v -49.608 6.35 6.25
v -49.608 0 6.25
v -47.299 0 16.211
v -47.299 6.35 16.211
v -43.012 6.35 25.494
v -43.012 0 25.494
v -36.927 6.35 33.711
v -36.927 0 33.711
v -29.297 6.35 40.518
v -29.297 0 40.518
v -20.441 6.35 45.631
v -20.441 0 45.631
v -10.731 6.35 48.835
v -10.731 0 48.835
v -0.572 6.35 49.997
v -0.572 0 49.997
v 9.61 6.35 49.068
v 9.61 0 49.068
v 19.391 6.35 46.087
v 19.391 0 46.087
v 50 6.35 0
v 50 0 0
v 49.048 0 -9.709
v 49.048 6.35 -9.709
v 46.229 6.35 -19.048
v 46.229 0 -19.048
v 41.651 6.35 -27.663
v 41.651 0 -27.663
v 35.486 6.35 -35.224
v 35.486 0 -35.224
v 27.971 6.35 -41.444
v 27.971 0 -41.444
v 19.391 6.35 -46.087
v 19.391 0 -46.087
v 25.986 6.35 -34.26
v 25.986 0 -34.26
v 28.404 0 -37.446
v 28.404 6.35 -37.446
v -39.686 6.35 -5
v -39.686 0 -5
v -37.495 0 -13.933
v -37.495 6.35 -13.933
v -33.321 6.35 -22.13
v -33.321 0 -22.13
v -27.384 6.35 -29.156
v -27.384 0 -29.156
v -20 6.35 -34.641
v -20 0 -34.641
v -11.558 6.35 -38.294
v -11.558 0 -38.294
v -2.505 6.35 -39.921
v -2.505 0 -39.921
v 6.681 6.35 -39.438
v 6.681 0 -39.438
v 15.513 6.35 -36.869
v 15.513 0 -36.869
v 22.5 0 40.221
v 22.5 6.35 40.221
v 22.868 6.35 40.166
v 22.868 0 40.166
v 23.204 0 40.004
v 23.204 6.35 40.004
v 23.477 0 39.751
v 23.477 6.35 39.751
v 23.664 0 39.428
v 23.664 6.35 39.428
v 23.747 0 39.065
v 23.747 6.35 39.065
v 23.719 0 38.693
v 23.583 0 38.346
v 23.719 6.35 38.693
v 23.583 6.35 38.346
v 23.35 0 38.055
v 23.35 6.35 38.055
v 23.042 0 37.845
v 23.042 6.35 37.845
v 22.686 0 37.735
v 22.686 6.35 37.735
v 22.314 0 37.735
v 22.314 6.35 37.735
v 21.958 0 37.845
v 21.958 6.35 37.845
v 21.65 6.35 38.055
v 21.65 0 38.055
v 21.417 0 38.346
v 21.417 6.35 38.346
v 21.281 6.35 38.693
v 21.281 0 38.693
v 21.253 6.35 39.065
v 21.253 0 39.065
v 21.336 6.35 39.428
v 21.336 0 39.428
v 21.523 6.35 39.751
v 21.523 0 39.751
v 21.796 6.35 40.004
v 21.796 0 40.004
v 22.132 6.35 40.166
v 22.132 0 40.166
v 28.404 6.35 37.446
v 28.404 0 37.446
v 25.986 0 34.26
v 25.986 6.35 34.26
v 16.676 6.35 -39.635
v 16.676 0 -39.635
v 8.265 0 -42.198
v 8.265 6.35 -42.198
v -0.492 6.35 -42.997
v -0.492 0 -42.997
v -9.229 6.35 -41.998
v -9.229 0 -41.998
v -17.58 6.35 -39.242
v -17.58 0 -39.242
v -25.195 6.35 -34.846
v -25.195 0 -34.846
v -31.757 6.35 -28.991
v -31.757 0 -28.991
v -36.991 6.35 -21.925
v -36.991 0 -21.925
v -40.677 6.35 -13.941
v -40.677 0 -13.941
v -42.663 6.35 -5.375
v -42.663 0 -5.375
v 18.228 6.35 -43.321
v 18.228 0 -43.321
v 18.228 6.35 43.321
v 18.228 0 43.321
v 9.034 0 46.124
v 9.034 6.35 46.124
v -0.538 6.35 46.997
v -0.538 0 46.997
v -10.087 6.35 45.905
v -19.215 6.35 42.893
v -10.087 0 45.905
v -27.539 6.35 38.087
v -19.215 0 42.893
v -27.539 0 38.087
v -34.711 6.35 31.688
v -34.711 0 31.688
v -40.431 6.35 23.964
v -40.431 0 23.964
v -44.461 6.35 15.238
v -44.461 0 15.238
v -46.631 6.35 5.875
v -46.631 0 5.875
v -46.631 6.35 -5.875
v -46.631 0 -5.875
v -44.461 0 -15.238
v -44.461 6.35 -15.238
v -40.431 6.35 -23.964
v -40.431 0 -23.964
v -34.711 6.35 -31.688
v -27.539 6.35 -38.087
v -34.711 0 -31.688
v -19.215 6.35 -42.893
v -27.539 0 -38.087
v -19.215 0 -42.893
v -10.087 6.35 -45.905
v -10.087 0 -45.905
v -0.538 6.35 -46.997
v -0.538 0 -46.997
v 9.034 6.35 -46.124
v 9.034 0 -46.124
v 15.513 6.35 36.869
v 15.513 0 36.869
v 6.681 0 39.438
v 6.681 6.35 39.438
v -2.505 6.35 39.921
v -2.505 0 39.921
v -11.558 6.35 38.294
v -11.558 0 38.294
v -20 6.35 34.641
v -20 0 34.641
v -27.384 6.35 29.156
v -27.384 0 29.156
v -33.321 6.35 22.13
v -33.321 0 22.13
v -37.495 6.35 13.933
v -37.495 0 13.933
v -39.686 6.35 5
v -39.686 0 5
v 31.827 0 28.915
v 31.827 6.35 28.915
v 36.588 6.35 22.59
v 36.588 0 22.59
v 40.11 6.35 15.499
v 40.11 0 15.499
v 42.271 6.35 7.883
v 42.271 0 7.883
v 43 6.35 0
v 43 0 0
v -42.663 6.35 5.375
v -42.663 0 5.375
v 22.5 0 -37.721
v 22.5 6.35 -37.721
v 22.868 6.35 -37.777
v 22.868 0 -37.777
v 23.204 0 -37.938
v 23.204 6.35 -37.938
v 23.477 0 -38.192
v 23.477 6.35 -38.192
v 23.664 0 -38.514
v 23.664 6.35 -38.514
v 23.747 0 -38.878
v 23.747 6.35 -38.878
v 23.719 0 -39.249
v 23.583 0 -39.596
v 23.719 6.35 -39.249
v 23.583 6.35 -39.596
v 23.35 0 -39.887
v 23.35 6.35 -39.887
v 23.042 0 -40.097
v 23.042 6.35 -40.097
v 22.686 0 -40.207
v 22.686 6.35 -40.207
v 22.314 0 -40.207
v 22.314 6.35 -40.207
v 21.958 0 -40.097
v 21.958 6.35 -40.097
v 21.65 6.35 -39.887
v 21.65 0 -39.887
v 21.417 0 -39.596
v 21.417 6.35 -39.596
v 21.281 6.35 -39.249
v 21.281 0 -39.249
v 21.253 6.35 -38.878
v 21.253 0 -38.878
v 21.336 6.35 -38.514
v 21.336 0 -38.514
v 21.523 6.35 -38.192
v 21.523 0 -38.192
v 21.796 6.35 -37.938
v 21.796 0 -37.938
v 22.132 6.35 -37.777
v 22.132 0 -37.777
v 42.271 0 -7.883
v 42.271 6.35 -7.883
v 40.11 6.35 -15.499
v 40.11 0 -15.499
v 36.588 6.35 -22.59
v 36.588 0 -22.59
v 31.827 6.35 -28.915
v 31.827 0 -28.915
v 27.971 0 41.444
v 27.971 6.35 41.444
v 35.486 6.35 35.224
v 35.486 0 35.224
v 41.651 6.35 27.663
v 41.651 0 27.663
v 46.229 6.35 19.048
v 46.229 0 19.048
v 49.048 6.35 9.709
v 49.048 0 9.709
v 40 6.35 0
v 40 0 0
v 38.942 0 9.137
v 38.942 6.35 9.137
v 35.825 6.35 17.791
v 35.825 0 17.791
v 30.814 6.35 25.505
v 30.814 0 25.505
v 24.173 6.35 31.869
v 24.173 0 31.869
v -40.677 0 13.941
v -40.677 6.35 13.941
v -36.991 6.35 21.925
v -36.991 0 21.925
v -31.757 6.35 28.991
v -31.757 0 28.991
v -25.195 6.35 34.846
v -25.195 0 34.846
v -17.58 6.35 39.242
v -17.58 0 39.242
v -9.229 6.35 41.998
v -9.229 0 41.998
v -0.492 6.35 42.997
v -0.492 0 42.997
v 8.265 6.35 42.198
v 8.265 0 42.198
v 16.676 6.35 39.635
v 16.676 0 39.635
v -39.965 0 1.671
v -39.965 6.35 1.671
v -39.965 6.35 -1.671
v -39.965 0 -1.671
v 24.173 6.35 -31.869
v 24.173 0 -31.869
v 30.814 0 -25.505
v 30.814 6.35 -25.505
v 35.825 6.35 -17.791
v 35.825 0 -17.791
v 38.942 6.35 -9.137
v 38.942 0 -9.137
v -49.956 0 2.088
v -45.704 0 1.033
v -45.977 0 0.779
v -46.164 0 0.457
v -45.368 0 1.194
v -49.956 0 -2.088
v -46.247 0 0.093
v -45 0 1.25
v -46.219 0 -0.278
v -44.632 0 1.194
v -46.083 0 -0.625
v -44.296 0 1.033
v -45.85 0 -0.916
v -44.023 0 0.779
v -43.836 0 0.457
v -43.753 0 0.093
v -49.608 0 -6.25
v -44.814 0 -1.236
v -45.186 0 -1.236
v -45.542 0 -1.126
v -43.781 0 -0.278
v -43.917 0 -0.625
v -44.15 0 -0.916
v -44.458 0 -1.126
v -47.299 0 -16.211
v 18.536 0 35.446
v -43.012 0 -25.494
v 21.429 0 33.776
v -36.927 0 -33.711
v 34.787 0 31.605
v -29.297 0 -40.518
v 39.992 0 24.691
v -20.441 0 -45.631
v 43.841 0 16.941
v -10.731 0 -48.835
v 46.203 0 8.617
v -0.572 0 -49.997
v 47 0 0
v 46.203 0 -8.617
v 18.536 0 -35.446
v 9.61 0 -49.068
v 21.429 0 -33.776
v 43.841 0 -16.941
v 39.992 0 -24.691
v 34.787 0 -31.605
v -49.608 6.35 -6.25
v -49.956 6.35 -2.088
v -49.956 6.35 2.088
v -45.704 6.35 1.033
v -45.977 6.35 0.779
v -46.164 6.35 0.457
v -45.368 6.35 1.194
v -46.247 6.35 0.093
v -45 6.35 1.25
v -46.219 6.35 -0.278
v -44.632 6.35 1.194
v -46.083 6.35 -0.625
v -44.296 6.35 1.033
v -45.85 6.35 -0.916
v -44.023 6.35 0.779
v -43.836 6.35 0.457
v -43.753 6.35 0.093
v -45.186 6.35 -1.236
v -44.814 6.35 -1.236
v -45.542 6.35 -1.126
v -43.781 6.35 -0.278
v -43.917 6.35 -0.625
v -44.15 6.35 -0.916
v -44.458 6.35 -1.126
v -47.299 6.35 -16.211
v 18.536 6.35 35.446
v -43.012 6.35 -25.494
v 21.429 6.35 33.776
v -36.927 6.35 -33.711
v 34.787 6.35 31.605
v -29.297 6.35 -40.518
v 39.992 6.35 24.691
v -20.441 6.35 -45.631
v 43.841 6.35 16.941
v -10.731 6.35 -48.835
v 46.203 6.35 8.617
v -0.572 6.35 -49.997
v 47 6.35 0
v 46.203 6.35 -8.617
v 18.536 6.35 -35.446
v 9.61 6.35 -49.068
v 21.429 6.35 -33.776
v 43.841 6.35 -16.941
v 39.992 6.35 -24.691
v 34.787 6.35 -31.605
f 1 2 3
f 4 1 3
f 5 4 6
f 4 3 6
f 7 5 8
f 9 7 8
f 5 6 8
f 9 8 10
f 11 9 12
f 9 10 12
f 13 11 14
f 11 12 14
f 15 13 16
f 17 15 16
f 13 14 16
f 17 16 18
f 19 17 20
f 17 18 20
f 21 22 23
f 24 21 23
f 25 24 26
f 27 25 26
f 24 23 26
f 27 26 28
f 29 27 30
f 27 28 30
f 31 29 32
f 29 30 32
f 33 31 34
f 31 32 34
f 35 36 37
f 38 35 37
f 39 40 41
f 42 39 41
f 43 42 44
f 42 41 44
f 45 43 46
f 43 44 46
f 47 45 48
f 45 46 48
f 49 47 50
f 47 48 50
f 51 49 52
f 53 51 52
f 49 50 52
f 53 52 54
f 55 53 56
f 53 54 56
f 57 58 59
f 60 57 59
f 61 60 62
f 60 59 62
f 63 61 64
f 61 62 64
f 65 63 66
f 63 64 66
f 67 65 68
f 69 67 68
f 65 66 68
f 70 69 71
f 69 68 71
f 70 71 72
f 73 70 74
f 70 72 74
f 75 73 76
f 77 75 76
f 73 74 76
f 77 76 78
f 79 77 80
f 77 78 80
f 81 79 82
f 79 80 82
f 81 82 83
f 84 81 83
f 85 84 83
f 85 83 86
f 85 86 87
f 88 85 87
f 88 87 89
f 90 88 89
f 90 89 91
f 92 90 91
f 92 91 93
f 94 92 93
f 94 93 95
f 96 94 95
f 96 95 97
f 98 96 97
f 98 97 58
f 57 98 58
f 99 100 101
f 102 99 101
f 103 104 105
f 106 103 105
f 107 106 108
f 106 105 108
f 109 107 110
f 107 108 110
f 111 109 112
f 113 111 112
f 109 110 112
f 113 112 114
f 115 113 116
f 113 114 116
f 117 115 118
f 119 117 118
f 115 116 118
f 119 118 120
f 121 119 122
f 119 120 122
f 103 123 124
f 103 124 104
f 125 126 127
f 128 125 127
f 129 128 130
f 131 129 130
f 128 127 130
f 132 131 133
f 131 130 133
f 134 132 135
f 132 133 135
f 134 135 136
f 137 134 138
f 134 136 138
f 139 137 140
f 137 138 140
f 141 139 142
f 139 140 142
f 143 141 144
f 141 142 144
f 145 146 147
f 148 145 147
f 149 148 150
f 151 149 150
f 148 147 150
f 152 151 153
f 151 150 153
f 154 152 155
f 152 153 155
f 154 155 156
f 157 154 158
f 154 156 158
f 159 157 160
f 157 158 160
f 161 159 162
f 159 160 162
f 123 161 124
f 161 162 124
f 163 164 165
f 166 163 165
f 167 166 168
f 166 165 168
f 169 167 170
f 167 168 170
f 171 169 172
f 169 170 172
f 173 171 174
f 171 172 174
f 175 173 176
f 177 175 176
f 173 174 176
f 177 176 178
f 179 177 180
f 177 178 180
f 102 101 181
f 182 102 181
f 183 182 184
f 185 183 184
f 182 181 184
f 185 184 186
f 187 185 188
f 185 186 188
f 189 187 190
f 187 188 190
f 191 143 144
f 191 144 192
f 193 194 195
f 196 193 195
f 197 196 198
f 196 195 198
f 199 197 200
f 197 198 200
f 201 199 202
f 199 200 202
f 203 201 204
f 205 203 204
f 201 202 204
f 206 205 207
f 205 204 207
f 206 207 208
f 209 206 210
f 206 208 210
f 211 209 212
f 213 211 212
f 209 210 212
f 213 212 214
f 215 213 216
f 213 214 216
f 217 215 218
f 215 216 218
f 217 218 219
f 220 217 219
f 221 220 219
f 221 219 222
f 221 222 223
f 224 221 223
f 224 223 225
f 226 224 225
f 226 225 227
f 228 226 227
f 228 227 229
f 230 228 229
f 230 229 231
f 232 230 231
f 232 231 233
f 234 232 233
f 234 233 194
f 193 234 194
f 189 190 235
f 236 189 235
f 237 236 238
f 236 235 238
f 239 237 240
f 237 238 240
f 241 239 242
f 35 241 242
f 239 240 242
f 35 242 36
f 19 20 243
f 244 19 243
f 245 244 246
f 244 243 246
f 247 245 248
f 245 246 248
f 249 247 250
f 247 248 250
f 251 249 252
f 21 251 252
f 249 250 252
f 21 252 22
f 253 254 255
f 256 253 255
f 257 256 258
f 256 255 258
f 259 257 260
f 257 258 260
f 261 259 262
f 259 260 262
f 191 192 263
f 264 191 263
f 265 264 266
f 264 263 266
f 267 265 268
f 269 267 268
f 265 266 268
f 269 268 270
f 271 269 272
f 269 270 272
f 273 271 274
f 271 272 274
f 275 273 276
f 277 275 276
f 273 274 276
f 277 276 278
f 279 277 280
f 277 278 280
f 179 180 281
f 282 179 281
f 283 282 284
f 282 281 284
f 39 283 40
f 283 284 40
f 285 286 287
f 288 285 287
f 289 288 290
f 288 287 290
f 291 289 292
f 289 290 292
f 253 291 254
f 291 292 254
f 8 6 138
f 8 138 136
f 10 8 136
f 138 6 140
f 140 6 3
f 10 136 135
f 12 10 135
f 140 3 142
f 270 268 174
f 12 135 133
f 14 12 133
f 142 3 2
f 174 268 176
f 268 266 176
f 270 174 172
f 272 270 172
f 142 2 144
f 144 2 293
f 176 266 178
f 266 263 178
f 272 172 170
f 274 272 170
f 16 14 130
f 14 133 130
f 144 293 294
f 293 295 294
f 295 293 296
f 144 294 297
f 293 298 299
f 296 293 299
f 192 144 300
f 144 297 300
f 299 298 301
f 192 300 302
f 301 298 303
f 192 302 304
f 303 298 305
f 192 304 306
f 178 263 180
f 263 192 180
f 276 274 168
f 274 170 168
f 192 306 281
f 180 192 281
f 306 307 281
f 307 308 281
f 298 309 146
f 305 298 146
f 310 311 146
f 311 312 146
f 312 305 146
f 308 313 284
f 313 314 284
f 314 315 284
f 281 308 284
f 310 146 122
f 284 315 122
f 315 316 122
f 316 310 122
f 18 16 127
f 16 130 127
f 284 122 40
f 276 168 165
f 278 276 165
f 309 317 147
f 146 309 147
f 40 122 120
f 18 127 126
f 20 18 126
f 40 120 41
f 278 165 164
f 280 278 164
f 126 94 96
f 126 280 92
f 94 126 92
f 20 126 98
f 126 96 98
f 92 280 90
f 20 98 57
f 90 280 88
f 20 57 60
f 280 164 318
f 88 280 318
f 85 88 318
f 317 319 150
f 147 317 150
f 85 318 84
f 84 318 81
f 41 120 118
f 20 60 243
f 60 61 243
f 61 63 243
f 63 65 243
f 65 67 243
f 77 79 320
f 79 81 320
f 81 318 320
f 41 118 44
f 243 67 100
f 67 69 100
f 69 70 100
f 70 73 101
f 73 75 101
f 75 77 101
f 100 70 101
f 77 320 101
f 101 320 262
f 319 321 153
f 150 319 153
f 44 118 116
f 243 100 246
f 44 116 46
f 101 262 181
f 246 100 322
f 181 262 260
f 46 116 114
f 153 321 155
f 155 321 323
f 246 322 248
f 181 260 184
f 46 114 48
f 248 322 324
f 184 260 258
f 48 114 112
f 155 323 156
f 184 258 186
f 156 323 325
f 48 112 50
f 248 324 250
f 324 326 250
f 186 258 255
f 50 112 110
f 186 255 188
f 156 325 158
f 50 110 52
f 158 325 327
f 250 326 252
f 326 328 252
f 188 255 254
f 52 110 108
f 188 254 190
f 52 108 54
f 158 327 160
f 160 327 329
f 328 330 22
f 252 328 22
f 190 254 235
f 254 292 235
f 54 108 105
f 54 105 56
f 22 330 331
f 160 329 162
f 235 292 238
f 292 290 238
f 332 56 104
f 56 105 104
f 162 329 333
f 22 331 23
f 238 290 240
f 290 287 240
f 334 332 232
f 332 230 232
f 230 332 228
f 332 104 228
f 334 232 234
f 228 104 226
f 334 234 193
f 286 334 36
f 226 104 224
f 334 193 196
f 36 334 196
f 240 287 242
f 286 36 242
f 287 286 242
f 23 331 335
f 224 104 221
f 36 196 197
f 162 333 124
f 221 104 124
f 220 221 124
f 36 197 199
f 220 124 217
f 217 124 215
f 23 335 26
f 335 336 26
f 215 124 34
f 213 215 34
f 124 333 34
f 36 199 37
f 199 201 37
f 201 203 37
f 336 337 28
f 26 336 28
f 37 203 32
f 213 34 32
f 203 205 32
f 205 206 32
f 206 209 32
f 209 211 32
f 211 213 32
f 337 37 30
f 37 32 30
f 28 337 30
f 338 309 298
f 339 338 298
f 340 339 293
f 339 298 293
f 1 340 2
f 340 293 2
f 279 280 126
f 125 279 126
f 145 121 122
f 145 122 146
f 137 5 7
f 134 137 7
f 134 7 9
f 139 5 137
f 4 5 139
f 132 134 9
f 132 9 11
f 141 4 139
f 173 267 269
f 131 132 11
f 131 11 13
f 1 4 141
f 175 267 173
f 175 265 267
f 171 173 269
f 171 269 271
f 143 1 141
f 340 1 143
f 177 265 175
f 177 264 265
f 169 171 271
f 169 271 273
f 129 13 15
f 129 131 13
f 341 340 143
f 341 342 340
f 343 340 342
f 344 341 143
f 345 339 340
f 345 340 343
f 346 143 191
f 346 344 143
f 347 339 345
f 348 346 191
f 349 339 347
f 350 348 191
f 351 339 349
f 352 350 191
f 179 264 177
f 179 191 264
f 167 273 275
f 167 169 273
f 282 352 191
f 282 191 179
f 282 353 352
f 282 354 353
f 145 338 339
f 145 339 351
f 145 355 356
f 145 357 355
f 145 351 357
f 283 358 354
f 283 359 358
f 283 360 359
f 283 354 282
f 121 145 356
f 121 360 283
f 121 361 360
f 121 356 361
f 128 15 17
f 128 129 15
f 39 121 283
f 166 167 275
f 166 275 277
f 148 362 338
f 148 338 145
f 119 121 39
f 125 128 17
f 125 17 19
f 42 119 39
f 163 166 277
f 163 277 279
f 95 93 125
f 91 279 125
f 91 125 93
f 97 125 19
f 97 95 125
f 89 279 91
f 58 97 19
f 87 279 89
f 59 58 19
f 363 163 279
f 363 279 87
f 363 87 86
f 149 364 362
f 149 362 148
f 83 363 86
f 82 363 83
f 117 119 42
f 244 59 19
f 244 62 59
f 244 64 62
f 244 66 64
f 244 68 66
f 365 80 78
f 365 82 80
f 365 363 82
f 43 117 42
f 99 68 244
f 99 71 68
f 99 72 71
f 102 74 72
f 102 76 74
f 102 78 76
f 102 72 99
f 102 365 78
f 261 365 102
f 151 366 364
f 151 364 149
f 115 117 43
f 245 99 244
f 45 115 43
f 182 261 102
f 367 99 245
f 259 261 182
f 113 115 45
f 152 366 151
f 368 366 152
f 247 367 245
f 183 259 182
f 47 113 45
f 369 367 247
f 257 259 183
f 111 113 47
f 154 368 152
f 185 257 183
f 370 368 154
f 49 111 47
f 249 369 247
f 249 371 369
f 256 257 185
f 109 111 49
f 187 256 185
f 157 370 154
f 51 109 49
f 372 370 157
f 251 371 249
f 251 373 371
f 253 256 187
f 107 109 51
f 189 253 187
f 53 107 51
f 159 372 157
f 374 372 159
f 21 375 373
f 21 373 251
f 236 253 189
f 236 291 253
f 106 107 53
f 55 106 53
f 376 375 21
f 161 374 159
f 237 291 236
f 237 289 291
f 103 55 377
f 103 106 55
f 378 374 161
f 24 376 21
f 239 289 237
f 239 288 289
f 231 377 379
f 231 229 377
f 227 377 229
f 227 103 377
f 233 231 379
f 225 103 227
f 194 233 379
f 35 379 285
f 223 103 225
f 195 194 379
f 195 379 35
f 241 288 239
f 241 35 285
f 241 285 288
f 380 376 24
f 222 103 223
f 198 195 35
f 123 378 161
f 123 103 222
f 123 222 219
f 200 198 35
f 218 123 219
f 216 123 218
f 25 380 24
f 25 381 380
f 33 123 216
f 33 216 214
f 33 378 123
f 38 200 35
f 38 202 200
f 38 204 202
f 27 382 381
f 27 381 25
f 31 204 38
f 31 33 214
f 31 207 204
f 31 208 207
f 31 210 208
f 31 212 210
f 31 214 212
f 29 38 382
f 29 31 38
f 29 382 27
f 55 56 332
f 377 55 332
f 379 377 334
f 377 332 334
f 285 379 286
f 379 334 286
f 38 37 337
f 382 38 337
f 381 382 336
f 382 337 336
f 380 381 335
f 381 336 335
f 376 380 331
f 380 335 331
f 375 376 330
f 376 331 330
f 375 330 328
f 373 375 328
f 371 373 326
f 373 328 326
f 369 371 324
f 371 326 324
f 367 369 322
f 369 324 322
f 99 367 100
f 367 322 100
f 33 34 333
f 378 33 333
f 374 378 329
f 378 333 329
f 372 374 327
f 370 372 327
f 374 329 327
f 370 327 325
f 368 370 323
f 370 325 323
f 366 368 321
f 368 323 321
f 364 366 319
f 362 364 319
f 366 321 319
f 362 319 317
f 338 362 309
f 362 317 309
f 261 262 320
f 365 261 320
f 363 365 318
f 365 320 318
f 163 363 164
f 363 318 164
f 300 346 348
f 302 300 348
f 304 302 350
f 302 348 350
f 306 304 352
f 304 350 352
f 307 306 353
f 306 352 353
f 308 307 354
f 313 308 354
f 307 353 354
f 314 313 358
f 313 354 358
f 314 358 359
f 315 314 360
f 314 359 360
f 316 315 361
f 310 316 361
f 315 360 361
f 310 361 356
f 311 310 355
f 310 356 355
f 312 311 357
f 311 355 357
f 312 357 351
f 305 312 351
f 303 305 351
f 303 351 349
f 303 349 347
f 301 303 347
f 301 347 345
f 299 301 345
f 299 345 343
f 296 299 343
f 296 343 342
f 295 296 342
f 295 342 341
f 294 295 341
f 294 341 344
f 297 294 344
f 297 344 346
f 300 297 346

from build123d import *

# Parameters (mm, degrees)
BOSS_EXTRUDE1_DEPTH = 6.35
M3_TAP_HOLES_REACH  = 72.995
SKETCH2_R           = 1.25


with BuildPart() as part:
    # Sketch1 → Boss-Extrude1 (new body)
    with BuildSketch(Plane(origin=(0, 0, 0), x_dir=(1, 0, 0), z_dir=(0, 1, 0))):
        with BuildLine():
            ThreePointArc((50, 0), (44.781853835, 22.239279825), (30.216577315, 39.83664714))
            Line((30.216577315, 39.83664714), (28.403582676, 37.446448312))
            ThreePointArc((28.403582676, 37.446448312), (42.094942605, 20.904923035), (47, 0))
            ThreePointArc((47, 0), (42.094942605, -20.904923035), (28.403582676, -37.446448312))
            Line((28.403582676, -37.446448312), (30.216577315, -39.83664714))
            ThreePointArc((30.216577315, -39.83664714), (44.781853835, -22.239279825), (50, 0))
        make_face()
        with BuildLine():
            ThreePointArc((43, 0), (38.512394298, 19.125780649), (25.986256491, 34.259516541))
            Line((25.986256491, 34.259516541), (24.173261852, 31.869317712))
            ThreePointArc((24.173261852, 31.869317712), (35.825483068, 17.79142386), (40, 0))
            ThreePointArc((40, 0), (35.825483068, -17.79142386), (24.173261852, -31.869317712))
            Line((24.173261852, -31.869317712), (25.986256491, -34.259516541))
            ThreePointArc((25.986256491, -34.259516541), (38.512394298, -19.125780649), (43, 0))
        make_face()
        with BuildLine():
            ThreePointArc((16.6764834, -39.634516541), (21.5, -37.239092363), (25.986256491, -34.259516541))
            Line((25.986256491, -34.259516541), (24.173261852, -31.869317712))
            ThreePointArc((24.173261852, -31.869317712), (20, -34.641016151), (15.513007814, -36.869317712))
            Line((15.513007814, -36.869317712), (16.6764834, -39.634516541))
        make_face()
        with BuildLine():
            ThreePointArc((18.227784182, -43.321448312), (23.5, -40.703193978), (28.403582676, -37.446448312))
            Line((28.403582676, -37.446448312), (25.986256491, -34.259516541))
            ThreePointArc((25.986256491, -34.259516541), (21.5, -37.239092363), (16.6764834, -39.634516541))
            Line((16.6764834, -39.634516541), (18.227784182, -43.321448312))
        make_face()
        with BuildLine():
            ThreePointArc((19.391259768, -46.08664714), (25, -43.301270189), (30.216577315, -39.83664714))
            Line((30.216577315, -39.83664714), (28.403582676, -37.446448312))
            ThreePointArc((28.403582676, -37.446448312), (23.5, -40.703193978), (18.227784182, -43.321448312))
            Line((18.227784182, -43.321448312), (19.391259768, -46.08664714))
        make_face()
        with BuildLine():
            ThreePointArc((-49.607837082, -6.25), (-25, -43.301270189), (19.391259768, -46.08664714))
            Line((19.391259768, -46.08664714), (18.227784182, -43.321448312))
            ThreePointArc((18.227784182, -43.321448312), (-23.5, -40.703193978), (-46.631366858, -5.875))
            Line((-46.631366858, -5.875), (-49.607837082, -6.25))
        make_face()
        with BuildLine():
            ThreePointArc((-42.662739891, -5.375), (-21.5, -37.239092363), (16.6764834, -39.634516541))
            Line((16.6764834, -39.634516541), (15.513007814, -36.869317712))
            ThreePointArc((15.513007814, -36.869317712), (-20, -34.641016151), (-39.686269666, -5))
            Line((-39.686269666, -5), (-42.662739891, -5.375))
        make_face()
        with BuildLine():
            Line((-39.686269666, 5), (-42.662739891, 5.375))
            ThreePointArc((-42.662739891, 5.375), (-43, 0), (-42.662739891, -5.375))
            Line((-42.662739891, -5.375), (-39.686269666, -5))
            ThreePointArc((-39.686269666, -5), (-40, 0), (-39.686269666, 5))
        make_face()
        with BuildLine():
            Line((-42.662739891, 5.375), (-46.631366858, 5.875))
            ThreePointArc((-46.631366858, 5.875), (-47, 0), (-46.631366858, -5.875))
            Line((-46.631366858, -5.875), (-42.662739891, -5.375))
            ThreePointArc((-42.662739891, -5.375), (-43, 0), (-42.662739891, 5.375))
        make_face()
        with BuildLine():
            Line((-46.631366858, 5.875), (-49.607837082, 6.25))
            ThreePointArc((-49.607837082, 6.25), (-50, 0), (-49.607837082, -6.25))
            Line((-49.607837082, -6.25), (-46.631366858, -5.875))
            ThreePointArc((-46.631366858, -5.875), (-47, 0), (-46.631366858, 5.875))
        make_face()
        with BuildLine():
            Line((18.227784182, 43.321448312), (19.391259768, 46.08664714))
            ThreePointArc((19.391259768, 46.08664714), (-25, 43.301270189), (-49.607837082, 6.25))
            Line((-49.607837082, 6.25), (-46.631366858, 5.875))
            ThreePointArc((-46.631366858, 5.875), (-23.5, 40.703193978), (18.227784182, 43.321448312))
        make_face()
        with BuildLine():
            Line((15.513007814, 36.869317712), (16.6764834, 39.634516541))
            ThreePointArc((16.6764834, 39.634516541), (-21.5, 37.239092363), (-42.662739891, 5.375))
            Line((-42.662739891, 5.375), (-39.686269666, 5))
            ThreePointArc((-39.686269666, 5), (-20, 34.641016151), (15.513007814, 36.869317712))
        make_face()
        with BuildLine():
            Line((24.173261852, 31.869317712), (25.986256491, 34.259516541))
            ThreePointArc((25.986256491, 34.259516541), (21.5, 37.239092363), (16.6764834, 39.634516541))
            Line((16.6764834, 39.634516541), (15.513007814, 36.869317712))
            ThreePointArc((15.513007814, 36.869317712), (20, 34.641016151), (24.173261852, 31.869317712))
        make_face()
        with BuildLine():
            Line((25.986256491, 34.259516541), (28.403582676, 37.446448312))
            ThreePointArc((28.403582676, 37.446448312), (23.5, 40.703193978), (18.227784182, 43.321448312))
            Line((18.227784182, 43.321448312), (16.6764834, 39.634516541))
            ThreePointArc((16.6764834, 39.634516541), (21.5, 37.239092363), (25.986256491, 34.259516541))
        make_face()
        with BuildLine():
            Line((28.403582676, 37.446448312), (30.216577315, 39.83664714))
            ThreePointArc((30.216577315, 39.83664714), (25, 43.301270189), (19.391259768, 46.08664714))
            Line((19.391259768, 46.08664714), (18.227784182, 43.321448312))
            ThreePointArc((18.227784182, 43.321448312), (23.5, 40.703193978), (28.403582676, 37.446448312))
        make_face()
    extrude(amount=BOSS_EXTRUDE1_DEPTH)

    # Sketch2 → M3-tap-holes (cut, up to next)
    with BuildSketch(Plane(origin=(0, 6.35, 0), x_dir=(1, 0, 0), z_dir=(0, 1, 0)), mode=Mode.PRIVATE) as m3_tap_holes_sk1:
        with Locations(Location((-45, 0, 0), (0, 0, 270))):
            Circle(SKETCH2_R)
    m3_tap_holes_tool1 = extrude(m3_tap_holes_sk1.sketch, amount=-M3_TAP_HOLES_REACH, mode=Mode.PRIVATE) & part.part
    # Sketch2 → M3-tap-holes (cut, up to next)
    with BuildSketch(Plane(origin=(0, 6.35, 0), x_dir=(1, 0, 0), z_dir=(0, 1, 0)), mode=Mode.PRIVATE) as m3_tap_holes_sk2:
        with Locations(Location((22.5, -38.97114317, 0), (0, 0, 270))):
            Circle(SKETCH2_R)
    m3_tap_holes_tool2 = extrude(m3_tap_holes_sk2.sketch, amount=-M3_TAP_HOLES_REACH, mode=Mode.PRIVATE) & part.part
    # Sketch2 → M3-tap-holes (cut, up to next)
    with BuildSketch(Plane(origin=(0, 6.35, 0), x_dir=(1, 0, 0), z_dir=(0, 1, 0)), mode=Mode.PRIVATE) as m3_tap_holes_sk3:
        with Locations(Location((22.5, 38.97114317, 0), (0, 0, 270))):
            Circle(SKETCH2_R)
    m3_tap_holes_tool3 = extrude(m3_tap_holes_sk3.sketch, amount=-M3_TAP_HOLES_REACH, mode=Mode.PRIVATE) & part.part
    add(m3_tap_holes_tool1.solids().sort_by_distance((-45, 6.35, 0))[0], mode=Mode.SUBTRACT)
    add(m3_tap_holes_tool2.solids().sort_by_distance((22.5, 6.35, 38.971143))[0], mode=Mode.SUBTRACT)
    add(m3_tap_holes_tool3.solids().sort_by_distance((22.5, 6.35, -38.971143))[0], mode=Mode.SUBTRACT)


solid = part.part
